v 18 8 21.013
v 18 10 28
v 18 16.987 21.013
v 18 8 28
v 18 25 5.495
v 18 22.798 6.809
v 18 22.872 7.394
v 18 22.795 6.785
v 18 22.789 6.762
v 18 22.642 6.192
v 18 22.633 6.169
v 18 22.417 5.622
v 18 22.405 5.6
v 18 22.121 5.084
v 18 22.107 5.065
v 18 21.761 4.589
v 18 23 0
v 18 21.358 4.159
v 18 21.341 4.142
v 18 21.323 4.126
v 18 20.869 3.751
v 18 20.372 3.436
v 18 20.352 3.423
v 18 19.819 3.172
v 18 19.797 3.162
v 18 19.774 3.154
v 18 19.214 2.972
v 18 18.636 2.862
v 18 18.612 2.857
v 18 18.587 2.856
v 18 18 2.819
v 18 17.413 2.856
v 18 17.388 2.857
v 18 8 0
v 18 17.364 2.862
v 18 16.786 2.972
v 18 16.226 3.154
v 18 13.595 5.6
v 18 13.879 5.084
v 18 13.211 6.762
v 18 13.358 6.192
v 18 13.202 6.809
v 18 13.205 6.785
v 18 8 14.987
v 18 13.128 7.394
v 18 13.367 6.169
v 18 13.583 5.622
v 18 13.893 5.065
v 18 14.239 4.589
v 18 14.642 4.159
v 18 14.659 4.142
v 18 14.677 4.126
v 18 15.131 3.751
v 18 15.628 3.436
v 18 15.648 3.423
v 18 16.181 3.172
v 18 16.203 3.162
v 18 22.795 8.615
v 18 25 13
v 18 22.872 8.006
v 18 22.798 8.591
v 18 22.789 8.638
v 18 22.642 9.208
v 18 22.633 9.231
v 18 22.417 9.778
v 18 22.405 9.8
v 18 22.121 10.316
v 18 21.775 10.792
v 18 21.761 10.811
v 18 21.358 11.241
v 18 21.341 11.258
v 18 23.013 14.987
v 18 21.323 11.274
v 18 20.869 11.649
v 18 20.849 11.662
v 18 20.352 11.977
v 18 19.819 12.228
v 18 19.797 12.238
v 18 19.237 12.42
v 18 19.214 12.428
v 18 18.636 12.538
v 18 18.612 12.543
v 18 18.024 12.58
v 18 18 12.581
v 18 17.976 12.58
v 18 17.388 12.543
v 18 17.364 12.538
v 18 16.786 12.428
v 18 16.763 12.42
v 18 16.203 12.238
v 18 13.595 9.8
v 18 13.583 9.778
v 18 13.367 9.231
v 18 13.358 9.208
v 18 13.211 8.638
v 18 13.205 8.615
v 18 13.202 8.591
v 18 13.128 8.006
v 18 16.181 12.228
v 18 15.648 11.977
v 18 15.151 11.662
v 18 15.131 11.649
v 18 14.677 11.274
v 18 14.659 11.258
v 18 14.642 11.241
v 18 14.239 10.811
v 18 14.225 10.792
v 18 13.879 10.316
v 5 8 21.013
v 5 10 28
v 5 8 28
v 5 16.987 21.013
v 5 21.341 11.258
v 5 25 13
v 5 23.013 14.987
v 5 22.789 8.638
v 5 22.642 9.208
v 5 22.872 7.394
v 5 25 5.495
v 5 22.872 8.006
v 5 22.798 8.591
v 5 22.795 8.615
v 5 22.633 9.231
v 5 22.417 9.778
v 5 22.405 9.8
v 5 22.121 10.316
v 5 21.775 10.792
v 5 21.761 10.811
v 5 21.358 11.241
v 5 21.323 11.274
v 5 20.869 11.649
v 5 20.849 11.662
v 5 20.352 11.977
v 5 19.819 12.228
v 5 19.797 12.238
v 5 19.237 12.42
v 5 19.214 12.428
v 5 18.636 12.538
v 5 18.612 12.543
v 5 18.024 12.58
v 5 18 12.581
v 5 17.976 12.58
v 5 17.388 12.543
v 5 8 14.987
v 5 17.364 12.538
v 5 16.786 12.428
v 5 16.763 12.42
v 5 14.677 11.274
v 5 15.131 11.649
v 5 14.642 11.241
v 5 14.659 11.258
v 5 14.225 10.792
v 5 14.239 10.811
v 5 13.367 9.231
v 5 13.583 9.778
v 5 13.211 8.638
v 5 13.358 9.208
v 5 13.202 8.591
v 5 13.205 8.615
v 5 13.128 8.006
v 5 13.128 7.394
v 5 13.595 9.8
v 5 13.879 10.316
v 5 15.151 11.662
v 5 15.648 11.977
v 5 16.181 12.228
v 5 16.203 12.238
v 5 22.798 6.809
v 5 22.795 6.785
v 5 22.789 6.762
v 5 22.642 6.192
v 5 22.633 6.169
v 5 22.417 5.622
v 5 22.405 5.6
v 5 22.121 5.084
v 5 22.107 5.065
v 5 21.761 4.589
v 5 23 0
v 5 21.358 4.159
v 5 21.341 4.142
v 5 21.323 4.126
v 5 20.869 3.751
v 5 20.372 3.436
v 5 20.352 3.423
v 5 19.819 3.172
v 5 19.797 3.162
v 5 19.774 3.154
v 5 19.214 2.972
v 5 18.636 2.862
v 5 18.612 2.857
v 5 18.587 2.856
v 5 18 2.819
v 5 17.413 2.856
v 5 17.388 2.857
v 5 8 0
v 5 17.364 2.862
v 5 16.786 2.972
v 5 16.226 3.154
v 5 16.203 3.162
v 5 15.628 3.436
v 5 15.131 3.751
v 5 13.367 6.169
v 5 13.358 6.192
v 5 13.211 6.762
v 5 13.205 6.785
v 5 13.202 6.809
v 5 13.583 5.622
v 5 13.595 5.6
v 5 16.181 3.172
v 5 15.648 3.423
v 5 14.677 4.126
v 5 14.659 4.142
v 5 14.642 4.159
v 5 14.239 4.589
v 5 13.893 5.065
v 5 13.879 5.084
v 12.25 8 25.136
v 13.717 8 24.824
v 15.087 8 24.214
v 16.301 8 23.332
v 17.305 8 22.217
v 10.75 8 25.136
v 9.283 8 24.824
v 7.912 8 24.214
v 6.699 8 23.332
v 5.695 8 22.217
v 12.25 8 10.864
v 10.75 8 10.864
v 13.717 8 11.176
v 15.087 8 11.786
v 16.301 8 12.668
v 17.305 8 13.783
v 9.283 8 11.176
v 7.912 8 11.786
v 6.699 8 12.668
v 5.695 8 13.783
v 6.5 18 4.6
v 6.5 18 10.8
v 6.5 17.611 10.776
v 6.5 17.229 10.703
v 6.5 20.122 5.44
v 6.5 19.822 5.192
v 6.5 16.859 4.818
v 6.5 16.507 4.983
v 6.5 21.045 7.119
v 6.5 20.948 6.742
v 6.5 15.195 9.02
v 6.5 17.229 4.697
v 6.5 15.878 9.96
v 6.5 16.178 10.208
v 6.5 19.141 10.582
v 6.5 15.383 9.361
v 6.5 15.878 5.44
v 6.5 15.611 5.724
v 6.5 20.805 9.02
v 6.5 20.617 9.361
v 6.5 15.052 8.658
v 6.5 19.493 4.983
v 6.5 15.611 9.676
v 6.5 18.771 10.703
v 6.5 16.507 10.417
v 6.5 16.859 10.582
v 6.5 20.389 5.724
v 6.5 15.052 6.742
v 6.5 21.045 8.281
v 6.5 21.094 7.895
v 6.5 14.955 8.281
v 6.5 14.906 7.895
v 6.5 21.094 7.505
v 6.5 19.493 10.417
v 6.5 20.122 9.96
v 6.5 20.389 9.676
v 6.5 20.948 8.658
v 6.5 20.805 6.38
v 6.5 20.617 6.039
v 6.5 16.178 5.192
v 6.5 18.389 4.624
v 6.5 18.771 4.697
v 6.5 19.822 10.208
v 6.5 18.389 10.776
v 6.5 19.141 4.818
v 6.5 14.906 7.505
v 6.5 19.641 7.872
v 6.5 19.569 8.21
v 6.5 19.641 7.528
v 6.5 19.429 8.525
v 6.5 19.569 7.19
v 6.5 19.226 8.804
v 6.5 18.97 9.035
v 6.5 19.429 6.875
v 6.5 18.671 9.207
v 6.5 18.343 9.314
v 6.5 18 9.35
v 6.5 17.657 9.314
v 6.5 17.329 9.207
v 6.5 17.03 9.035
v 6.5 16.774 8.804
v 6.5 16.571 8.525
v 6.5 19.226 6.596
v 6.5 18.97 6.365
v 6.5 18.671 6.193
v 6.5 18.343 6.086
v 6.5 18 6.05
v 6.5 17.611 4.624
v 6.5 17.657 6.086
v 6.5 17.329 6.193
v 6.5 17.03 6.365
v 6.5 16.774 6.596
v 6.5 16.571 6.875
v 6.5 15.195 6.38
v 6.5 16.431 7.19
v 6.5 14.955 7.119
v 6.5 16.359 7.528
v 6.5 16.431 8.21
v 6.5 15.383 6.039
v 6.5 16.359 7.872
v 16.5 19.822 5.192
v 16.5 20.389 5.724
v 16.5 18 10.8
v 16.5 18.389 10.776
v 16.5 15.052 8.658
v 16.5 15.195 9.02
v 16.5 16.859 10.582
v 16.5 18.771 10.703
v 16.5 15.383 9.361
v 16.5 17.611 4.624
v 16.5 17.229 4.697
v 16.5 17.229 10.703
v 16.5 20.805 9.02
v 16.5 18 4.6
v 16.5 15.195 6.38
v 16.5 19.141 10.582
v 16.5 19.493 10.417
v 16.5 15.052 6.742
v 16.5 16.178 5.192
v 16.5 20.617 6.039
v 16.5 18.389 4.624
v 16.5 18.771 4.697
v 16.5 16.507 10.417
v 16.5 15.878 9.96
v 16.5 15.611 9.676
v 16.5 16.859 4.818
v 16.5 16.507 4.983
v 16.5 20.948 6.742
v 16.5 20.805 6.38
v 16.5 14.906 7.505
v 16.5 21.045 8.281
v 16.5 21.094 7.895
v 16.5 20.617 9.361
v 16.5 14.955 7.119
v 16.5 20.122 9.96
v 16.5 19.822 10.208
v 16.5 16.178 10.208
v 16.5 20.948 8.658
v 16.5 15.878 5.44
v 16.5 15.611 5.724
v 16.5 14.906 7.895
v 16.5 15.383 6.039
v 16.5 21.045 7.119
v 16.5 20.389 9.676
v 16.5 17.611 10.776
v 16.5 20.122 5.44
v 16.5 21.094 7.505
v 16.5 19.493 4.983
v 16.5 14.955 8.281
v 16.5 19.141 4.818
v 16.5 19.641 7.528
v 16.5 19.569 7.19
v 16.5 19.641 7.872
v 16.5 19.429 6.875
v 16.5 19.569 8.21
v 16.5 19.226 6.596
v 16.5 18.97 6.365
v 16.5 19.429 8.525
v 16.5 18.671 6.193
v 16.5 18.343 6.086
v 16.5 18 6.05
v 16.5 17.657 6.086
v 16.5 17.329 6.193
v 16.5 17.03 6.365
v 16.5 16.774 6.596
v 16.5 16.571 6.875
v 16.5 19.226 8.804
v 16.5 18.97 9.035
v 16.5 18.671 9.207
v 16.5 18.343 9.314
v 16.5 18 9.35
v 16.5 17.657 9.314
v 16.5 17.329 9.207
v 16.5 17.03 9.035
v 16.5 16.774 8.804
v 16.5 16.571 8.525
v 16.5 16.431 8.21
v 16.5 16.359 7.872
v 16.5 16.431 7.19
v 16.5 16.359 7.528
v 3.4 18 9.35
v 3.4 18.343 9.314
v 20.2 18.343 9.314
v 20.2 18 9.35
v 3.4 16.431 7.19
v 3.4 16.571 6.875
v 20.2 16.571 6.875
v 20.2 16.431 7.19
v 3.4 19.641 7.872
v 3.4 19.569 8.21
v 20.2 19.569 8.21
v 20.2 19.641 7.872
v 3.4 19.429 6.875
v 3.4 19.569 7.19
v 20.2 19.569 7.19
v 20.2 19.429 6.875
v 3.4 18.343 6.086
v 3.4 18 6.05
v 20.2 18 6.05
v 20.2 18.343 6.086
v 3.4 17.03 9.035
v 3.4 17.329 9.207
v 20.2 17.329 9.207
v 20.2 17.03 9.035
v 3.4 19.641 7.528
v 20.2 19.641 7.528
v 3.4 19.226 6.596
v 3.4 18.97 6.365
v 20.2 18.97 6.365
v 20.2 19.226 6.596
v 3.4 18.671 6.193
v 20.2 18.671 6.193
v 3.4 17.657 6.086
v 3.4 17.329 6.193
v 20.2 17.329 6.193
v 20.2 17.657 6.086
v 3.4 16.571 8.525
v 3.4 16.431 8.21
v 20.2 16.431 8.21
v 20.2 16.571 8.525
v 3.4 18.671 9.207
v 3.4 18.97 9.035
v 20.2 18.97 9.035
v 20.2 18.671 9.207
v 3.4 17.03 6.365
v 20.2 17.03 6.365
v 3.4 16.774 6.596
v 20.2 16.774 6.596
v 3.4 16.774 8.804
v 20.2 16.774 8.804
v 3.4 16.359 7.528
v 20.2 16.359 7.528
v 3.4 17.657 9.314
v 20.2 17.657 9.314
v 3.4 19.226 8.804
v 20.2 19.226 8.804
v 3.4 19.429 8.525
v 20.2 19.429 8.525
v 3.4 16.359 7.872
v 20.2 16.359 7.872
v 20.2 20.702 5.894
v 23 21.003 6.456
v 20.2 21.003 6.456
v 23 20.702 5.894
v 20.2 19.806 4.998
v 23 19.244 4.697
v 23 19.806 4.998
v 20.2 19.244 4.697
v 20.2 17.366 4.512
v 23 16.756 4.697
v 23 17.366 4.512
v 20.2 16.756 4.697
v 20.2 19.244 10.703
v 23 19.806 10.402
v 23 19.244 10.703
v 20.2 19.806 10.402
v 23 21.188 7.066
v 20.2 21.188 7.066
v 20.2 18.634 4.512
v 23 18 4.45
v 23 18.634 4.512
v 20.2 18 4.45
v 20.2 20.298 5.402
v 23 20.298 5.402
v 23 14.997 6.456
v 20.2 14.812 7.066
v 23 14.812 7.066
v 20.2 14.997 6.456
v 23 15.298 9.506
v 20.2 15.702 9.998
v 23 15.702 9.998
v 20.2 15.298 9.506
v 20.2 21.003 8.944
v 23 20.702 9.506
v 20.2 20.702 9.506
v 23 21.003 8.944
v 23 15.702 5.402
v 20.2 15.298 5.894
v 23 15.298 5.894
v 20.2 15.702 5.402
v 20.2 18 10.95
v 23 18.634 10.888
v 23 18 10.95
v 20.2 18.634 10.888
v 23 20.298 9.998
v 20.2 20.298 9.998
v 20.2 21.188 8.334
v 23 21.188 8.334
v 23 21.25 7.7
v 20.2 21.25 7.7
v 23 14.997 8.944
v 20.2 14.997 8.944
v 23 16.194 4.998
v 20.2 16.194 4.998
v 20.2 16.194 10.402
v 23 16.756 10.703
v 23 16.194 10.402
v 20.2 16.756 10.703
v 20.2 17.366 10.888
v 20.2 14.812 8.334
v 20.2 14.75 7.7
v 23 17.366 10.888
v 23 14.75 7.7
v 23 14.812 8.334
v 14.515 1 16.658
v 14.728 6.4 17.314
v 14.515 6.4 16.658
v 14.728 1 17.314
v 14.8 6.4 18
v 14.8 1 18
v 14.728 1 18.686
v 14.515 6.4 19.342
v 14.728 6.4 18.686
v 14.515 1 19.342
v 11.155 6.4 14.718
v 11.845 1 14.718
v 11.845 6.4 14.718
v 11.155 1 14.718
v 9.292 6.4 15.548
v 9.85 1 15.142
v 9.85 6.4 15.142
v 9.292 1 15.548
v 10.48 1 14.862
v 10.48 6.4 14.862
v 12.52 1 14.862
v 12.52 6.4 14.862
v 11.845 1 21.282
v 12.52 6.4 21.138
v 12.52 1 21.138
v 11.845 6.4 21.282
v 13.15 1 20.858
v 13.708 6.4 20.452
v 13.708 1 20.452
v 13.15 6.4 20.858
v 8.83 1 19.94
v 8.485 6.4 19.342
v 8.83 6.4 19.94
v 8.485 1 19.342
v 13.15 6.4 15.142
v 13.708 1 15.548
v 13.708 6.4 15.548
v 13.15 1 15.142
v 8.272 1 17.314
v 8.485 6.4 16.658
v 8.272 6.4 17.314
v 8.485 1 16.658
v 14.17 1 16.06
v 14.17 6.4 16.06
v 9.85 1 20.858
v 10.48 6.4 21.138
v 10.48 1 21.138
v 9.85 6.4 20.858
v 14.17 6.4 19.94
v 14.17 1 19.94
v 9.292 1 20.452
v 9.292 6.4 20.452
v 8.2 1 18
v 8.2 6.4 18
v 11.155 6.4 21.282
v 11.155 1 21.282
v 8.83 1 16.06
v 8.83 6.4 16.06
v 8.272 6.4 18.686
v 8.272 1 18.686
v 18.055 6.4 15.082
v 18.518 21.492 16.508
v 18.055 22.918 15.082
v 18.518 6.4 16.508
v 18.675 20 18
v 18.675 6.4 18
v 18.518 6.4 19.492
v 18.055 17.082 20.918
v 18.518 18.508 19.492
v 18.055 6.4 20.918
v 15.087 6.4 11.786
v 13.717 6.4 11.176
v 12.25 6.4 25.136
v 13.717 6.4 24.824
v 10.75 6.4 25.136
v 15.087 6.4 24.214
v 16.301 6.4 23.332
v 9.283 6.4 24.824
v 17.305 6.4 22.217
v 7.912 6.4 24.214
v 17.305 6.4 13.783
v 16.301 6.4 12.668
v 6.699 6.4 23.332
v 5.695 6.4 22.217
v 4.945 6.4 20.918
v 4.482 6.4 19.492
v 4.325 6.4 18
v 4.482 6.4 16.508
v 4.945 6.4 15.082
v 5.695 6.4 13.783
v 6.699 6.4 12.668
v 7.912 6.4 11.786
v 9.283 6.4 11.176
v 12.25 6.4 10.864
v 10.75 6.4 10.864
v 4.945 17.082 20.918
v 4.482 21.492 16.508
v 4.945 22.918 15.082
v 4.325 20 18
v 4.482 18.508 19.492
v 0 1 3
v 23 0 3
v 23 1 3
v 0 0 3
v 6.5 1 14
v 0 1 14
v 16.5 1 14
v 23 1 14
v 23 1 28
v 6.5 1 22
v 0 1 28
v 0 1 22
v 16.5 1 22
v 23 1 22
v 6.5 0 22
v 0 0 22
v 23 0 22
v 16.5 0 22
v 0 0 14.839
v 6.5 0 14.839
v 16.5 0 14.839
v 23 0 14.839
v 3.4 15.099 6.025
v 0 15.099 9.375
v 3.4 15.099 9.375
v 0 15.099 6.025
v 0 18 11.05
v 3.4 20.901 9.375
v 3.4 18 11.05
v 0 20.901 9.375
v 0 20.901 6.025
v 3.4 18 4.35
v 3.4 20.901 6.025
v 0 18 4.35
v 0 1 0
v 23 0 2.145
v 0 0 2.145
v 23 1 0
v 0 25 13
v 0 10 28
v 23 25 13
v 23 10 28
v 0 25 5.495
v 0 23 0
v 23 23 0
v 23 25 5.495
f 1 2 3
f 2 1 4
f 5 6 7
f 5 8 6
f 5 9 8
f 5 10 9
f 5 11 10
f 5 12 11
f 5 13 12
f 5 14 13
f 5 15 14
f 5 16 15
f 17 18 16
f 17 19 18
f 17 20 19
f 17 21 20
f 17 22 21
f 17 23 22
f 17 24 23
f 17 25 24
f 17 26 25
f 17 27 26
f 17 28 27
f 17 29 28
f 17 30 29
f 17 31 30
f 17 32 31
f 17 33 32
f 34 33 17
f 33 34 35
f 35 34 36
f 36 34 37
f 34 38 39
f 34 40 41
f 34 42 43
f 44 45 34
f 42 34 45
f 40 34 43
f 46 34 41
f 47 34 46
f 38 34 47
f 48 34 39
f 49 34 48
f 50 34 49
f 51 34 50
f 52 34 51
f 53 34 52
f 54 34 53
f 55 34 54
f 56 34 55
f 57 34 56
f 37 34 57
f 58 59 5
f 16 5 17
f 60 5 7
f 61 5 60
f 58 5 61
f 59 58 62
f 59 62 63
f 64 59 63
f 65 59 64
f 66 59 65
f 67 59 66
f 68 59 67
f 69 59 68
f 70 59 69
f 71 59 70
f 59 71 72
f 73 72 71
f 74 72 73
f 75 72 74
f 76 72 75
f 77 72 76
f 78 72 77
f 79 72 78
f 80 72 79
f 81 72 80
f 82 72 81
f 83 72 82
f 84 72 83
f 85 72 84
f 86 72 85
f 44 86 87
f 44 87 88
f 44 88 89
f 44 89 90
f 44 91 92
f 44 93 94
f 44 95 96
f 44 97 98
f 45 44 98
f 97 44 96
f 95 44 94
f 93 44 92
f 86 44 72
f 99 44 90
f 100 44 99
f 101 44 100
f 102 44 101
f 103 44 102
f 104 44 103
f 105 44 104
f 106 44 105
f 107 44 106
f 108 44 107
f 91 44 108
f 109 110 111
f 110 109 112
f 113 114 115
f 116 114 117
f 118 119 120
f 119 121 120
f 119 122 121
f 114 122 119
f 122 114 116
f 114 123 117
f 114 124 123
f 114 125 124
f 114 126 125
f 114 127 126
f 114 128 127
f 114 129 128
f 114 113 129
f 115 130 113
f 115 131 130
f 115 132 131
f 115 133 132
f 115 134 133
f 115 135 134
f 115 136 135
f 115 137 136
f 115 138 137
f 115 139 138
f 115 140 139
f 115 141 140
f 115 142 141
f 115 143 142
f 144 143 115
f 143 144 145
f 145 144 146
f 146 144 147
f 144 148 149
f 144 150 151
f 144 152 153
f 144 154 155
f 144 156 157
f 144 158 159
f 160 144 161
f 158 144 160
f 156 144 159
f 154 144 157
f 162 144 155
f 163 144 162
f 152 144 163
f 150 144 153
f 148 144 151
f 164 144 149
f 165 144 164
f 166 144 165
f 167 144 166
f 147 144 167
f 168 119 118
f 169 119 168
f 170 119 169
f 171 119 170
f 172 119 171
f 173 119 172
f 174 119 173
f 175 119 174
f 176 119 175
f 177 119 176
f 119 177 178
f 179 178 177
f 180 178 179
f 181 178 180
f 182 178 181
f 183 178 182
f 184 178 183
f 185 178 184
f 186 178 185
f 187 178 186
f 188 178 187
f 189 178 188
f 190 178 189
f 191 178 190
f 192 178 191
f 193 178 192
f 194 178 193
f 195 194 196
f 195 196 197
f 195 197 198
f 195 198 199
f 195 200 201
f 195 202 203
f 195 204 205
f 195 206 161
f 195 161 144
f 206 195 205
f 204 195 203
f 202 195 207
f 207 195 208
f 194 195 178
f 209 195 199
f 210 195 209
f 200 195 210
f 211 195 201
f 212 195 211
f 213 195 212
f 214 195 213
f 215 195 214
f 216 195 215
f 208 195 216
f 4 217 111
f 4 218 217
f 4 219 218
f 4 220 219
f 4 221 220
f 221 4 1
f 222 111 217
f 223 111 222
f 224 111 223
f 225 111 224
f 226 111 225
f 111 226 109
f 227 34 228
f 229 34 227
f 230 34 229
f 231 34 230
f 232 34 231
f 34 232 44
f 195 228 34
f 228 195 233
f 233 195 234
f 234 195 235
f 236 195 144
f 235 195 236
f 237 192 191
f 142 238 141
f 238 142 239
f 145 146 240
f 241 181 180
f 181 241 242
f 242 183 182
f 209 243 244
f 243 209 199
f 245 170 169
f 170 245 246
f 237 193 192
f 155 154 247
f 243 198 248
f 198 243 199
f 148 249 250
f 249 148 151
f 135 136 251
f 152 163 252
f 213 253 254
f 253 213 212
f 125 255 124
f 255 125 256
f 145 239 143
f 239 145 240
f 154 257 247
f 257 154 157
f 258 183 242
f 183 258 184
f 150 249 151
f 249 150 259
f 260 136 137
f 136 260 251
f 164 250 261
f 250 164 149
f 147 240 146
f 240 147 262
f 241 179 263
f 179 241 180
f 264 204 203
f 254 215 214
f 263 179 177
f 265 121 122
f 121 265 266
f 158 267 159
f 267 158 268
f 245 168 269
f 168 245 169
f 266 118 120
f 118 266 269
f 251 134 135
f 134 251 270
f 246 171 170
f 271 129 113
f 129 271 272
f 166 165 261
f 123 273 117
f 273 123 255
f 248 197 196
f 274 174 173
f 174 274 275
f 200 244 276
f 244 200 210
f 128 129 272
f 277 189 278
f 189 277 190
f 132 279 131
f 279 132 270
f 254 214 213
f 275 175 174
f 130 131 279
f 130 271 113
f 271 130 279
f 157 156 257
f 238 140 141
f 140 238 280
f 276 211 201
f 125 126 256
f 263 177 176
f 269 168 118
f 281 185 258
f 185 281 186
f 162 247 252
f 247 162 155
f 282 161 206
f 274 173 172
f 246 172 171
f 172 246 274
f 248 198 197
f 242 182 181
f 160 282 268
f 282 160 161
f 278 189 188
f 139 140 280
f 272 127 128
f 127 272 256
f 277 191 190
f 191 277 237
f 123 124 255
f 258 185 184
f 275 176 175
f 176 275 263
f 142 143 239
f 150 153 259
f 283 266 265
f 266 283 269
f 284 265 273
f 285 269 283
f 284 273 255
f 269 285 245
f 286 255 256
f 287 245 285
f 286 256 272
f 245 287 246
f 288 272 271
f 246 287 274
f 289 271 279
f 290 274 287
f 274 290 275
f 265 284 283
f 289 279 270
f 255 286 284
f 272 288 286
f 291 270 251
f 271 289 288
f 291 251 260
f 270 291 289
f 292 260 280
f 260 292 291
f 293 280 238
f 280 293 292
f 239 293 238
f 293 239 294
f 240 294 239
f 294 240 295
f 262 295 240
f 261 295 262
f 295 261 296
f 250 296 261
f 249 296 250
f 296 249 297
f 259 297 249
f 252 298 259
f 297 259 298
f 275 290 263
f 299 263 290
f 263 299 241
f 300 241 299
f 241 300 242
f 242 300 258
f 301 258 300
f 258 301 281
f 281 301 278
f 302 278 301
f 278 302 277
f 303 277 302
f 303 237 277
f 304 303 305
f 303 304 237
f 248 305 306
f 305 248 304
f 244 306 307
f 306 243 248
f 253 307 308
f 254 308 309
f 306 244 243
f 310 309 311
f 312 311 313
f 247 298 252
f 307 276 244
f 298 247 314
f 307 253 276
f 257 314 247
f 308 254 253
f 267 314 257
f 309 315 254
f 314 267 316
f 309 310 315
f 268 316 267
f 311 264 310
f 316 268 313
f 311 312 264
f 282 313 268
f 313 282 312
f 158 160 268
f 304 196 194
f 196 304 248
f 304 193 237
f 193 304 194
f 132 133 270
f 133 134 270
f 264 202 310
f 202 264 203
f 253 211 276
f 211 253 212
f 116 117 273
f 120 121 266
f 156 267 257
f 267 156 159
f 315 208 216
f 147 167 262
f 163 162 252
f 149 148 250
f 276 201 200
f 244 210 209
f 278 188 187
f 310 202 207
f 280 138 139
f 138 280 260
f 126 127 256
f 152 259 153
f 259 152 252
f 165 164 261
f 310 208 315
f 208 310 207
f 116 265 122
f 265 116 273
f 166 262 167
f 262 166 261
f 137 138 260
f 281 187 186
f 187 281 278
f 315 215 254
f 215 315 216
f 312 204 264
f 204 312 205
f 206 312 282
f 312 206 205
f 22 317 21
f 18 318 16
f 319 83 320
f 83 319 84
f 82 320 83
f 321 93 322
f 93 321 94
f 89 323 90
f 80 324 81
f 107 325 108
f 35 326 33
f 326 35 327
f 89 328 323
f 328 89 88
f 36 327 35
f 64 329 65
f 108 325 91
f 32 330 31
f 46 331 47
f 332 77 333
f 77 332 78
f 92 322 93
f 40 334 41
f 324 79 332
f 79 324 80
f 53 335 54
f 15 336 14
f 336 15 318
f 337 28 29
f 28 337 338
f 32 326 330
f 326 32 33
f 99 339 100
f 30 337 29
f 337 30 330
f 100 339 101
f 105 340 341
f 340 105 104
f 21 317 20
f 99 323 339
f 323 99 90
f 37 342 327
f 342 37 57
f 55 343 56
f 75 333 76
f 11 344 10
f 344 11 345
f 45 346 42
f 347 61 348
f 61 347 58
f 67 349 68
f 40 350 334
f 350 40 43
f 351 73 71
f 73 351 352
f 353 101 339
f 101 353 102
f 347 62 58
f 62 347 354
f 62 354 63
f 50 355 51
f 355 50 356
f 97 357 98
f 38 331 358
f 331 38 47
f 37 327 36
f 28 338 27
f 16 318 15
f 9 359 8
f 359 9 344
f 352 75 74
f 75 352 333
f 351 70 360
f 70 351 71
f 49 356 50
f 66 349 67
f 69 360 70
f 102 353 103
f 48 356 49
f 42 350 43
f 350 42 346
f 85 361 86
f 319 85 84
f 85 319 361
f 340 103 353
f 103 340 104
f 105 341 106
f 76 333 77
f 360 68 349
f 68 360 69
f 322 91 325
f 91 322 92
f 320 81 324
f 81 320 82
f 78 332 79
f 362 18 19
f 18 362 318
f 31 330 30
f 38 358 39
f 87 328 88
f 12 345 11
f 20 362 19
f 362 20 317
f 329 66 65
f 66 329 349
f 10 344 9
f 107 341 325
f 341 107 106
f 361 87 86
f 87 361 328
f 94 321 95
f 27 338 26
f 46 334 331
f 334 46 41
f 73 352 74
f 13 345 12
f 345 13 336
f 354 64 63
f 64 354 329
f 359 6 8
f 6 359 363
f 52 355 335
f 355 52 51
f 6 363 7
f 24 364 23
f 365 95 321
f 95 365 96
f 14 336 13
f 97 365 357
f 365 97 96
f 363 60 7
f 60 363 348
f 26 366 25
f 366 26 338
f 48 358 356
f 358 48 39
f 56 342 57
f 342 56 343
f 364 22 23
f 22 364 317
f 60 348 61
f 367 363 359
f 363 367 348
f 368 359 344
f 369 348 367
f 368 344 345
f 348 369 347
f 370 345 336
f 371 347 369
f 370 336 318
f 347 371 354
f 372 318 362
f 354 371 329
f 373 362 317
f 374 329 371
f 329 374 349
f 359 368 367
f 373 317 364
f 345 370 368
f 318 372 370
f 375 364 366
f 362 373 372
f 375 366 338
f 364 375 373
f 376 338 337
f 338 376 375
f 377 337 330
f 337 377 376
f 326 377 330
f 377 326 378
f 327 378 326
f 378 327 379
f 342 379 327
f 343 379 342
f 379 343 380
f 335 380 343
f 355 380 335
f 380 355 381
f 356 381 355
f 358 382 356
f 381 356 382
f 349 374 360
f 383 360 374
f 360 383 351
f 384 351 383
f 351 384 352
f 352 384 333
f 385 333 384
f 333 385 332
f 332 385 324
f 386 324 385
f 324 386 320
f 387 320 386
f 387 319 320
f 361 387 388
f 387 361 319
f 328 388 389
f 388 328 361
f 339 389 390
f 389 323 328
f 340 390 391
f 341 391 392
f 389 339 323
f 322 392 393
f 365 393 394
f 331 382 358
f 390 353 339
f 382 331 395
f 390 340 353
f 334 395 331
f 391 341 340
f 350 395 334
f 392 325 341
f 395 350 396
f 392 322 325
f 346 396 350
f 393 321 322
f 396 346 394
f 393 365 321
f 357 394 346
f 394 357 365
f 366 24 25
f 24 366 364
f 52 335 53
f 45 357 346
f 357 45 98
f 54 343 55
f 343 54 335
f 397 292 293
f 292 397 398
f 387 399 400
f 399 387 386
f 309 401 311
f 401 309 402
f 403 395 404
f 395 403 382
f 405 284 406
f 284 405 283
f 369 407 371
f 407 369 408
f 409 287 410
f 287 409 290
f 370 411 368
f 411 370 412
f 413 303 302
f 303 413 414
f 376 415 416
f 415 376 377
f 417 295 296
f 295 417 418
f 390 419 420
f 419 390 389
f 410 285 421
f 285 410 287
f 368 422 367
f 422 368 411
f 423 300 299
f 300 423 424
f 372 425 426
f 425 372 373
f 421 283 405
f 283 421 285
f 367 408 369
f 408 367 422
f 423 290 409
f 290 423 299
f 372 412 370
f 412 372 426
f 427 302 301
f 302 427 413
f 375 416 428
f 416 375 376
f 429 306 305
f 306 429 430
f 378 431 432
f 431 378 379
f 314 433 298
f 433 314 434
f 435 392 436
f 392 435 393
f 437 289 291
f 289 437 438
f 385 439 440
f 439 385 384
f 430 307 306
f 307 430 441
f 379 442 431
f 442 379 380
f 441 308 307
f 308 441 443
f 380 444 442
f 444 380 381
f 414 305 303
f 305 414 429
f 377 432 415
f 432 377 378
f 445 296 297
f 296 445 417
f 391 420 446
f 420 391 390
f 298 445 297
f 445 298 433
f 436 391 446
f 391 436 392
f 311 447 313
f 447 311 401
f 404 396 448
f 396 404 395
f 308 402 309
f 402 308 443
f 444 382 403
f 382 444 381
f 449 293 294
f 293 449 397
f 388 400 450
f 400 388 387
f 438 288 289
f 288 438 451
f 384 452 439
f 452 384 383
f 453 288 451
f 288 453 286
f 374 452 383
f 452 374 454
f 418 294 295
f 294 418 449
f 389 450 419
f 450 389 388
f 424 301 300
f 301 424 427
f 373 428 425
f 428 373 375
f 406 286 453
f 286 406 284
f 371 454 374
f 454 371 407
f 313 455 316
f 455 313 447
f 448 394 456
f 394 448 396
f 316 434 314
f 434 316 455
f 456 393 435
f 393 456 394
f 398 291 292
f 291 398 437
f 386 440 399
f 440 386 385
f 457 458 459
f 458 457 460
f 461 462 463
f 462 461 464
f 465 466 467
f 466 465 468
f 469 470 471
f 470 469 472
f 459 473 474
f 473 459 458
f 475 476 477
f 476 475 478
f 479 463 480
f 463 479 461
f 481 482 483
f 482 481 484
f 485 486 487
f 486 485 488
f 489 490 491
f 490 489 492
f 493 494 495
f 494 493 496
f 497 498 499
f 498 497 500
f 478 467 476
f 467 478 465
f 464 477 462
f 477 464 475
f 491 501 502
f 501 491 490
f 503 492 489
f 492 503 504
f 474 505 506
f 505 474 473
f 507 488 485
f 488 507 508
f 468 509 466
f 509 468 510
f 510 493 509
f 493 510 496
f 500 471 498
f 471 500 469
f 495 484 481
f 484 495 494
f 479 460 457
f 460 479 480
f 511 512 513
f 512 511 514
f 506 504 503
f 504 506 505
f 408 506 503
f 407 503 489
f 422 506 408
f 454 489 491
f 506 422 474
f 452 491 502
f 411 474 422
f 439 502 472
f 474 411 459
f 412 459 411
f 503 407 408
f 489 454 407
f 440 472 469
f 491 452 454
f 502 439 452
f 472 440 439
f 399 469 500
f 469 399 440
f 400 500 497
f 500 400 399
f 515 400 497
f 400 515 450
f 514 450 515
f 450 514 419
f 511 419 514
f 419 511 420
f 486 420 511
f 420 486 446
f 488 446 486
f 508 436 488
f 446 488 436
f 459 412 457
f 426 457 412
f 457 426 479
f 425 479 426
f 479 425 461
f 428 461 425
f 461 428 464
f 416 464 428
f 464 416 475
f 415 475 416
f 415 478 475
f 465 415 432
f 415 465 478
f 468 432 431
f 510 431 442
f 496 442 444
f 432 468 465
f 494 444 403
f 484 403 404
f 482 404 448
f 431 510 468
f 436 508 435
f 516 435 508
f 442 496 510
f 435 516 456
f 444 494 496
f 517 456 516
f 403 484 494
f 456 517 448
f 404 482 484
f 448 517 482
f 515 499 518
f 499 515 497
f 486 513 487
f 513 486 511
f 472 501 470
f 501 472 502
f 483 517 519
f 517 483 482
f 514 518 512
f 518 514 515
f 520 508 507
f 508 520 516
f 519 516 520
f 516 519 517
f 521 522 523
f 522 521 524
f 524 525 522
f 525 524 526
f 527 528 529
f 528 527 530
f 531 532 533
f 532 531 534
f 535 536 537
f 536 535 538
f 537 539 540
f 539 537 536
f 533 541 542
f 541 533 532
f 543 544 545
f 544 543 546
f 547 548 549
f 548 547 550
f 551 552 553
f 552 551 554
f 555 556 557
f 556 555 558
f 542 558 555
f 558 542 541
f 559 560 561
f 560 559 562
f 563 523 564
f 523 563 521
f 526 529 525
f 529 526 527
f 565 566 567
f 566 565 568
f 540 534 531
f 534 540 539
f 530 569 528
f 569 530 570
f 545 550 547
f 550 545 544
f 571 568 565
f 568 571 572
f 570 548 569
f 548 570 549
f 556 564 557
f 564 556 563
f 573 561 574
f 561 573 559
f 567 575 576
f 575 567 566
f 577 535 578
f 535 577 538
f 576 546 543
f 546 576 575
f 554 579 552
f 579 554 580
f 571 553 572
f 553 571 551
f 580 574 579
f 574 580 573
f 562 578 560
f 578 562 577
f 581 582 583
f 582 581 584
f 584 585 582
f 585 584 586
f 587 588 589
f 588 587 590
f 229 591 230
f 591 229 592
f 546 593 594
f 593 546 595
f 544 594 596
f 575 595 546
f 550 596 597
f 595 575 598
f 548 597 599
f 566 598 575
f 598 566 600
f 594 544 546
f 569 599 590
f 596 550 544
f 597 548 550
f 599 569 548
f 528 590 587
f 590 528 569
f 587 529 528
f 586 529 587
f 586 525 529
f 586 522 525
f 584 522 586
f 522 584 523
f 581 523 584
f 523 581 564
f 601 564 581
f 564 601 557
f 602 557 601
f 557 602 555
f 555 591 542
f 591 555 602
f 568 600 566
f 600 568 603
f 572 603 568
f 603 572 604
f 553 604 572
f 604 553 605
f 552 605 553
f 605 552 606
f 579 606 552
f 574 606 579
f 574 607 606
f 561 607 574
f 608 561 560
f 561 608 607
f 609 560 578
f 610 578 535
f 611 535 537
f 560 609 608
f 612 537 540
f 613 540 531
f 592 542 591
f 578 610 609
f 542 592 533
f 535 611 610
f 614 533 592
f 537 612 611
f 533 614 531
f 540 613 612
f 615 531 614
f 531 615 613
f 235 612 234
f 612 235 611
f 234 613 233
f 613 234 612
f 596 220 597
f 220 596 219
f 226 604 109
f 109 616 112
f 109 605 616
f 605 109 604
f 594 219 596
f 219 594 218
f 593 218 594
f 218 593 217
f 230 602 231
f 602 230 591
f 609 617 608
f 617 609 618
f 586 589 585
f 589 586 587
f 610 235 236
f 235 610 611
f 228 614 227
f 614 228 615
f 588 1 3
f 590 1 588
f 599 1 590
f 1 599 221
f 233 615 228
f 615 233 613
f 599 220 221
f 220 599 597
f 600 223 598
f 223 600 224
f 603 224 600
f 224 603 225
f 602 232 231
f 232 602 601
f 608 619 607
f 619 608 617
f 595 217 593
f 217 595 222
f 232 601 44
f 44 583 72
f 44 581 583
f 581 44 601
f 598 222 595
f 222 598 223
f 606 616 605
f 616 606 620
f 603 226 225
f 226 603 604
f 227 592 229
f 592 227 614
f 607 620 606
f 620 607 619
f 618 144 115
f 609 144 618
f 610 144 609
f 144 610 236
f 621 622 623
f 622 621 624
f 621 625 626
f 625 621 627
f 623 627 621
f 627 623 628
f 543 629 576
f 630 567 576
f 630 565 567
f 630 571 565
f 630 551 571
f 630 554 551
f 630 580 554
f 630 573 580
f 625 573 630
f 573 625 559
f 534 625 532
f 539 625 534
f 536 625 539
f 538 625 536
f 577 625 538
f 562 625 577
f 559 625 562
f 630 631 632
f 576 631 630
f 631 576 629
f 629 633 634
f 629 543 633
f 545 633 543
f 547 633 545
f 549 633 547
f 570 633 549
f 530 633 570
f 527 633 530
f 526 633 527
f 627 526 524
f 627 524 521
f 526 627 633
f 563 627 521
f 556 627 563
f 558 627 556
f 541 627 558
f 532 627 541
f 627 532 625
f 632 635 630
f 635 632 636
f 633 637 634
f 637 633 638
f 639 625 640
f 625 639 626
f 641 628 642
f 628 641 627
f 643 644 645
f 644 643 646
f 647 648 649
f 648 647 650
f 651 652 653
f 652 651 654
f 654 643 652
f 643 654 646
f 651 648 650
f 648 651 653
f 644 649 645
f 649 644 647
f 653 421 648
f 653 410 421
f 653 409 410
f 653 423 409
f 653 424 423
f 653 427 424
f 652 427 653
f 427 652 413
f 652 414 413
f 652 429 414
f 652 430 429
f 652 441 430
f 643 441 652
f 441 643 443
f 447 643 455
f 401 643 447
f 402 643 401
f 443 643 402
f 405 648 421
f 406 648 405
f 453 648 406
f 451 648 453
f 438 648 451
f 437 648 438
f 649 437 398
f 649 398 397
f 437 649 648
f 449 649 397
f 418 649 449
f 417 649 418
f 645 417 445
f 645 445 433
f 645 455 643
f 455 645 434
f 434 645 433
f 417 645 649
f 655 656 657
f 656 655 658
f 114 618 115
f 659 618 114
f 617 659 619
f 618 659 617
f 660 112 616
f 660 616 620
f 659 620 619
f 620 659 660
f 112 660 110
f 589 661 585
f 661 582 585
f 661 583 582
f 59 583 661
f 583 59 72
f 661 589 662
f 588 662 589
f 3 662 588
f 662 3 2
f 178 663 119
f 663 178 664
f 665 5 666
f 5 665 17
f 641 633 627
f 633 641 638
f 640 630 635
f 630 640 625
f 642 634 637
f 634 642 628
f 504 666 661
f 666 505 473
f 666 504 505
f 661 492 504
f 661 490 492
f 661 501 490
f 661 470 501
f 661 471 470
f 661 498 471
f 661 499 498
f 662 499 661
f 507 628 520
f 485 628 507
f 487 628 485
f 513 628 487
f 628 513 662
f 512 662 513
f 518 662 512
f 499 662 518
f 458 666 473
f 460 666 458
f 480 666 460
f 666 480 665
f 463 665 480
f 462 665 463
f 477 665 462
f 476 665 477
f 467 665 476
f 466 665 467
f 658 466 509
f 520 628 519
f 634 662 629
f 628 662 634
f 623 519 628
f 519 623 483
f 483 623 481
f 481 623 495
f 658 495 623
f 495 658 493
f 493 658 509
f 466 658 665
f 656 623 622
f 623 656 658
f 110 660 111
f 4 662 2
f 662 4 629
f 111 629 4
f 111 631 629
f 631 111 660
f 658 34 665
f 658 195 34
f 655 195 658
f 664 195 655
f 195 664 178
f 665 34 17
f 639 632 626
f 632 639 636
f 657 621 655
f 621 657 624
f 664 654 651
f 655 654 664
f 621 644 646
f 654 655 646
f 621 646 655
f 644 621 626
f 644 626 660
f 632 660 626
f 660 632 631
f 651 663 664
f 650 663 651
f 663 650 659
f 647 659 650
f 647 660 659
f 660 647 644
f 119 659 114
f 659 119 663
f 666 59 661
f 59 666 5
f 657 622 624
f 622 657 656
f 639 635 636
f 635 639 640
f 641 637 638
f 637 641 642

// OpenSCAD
// file: ../configuration.scad
// Layer high for the printing [mm]
layer_height = 0.20; //Slic3r->Print Settings->Layers and perimeters->Layer height

// Spare for the screws heads [mm]
spare = 0.75;
// M6 screw diameter [mm]
M6_head_diameter = 13.6+spare;
//M6_head_diameter = 10.6+spare;
//M6_head_diameter = 12+spare;

// M6 head high (for hiding it) [mm]
//M6_head_height = 4;
M6_head_height = 3.6;
//M6_head_height = 4.5;

// Screws and rods diameters
M8_smooth_rod_diameter = 8.3;
M8_smooth_rod_diameter_catch = 8.4;
// Prumer 8mm tyce
rod_8mm_d = 8.2; //pro dil z-top
M6_diameter = 6.6;
M6_dia=M6_diameter; //pro dil z-top
M6_diamater_horizontal = 6.5;
M3_diameter = 3.7;
M3_diameter_horizontal = 3.5;

//matice trapézové tyče
TRAP_diameter_externa=22; //průmer vnější


// Nuts diameters
M3_nut_diameter = 7.0;
M3_nut_diameter_horizontal = 6.7;

// ALU profile parameters
ALU_cut_width = 7.9;
ALU_cut_width_horizontal = 7.7;

// Sirka matky do profilu (pokud neni pouzita, tak 0)
profile_nut_width = 10;
//profile_nut_width = 0; //pro z-top

// Motors length/depth (for axes Z and Y)
//SX17-1003LQFE (recommended for the Z axis)
motor_length = 29.5;
//SX17-1003 (recommended for the Z axis)
//motor_length = 34;
//SX17-1005
//motor_length = 40;
//SX17-0905 - this motor is too high - the Z end stop holder has to be adjusted
//motor_length = 48;

// Extrusion width [mm]
extrusion_width = 0.66; //Slic3r->Print Settings->Advanced->Default extrusion width

/// Belt type ******************************************************

// GT2
belt_tooth_distance = 2;
belt_tooth_ratio = 0.5;
belt_tooth_height = 1.4;
belt_thickness = 2.3;


// T2.5
//belt_tooth_distance = 2.5;
//belt_tooth_ratio = 0.68;

// Z screw......



// Tloustka rohovych spojek
// 5 mm => sroub M6x14 s podlozkou
// 3 mm => sroub M6x12 s podlozkou
coupler_thickness = 3;
// main file
// RebeliX
//
// y-idler
// GNU GPL v3
// Martin Neruda <neruda@reprap4u.cz>
// http://www.reprap4u.cz

include <../configuration.scad>
$fn = 50;
// Lozisko 624
bearing_width = 10;

wall = 5;
height = 28;
depth = 25;
width = bearing_width+2*wall+3;
base_thickness = 8;

module y_idler_base(){
	cube([width,depth,height]);
}

module y_idler_cuts(){
	difference(){
	  // Vyrez pro lozisko
	  translate([wall,base_thickness,-0.1]) cube([width-2*wall,depth,height+1]);
	  // Mezera pro loziska
	  translate([wall-0.1,depth-7,7.7]) rotate([0,90,0]) cylinder(r1=5,r2=3.1,h=1.6);
	  translate([width-wall+0.1,depth-7,7.7]) rotate([0,-90,0]) cylinder(r1=5,r2=3.1,h=1.6);
	}
	// Otvor pro sroub na lozisko
	translate([width/2,depth-7,7.7]) rotate([0,90,0]) cylinder(d = 3.3, h = width+1, $fn = 30,center=true);
	translate([width,depth-7,7.7]) rotate([0,90,0])cylinder(d=6.5,h=wall+0.6,$fn=32,center=true);
	
	// Otvor na prisroubovani do kombistojky
	translate([width/2,-0.1,3+15]) rotate([-90,0,0]) cylinder(r = M6_dia/2, h = depth, $fn = 30);
	// Otvor pro zahloubeni M6 sroubu
	translate([width/2,base_thickness-M6_head_height+2,3+15]) rotate([-90,0,0]) cylinder(r = M6_head_diameter/2, h = depth, $fn = 30);
	// Vyrez pro hlinikovy profil
	translate([-0.1,-0.1,3]) cube([width+1,1.1,15-4]);
	translate([-0.1,-0.1,3+15+4]) cube([width+1,1.1,15-4]);
	translate([-0.1,1,3+15-4]) rotate([180 - 40,0,0]) cube([30,3,8]); 
	// Otvor na matku
	translate([-0.1,depth-7,7.7]) rotate([0,90,0]) cylinder(h = 3.5, d=6.7, $fn=6);	
	// Setreni plastem
	translate([-0.1,1,0]) rotate([115,0,0]) cube([width+1,6,6]);
	translate([-0.1,depth,13]) rotate([45,0,0]) cube([width+1,depth+2,height]);
	translate([-0.1,depth-2,0]) rotate([-20,0,0]) cube([width+1,10,10]);
	
	// Vyrez pro profilovou matku 
    translate([width/2,-6/2 + 1,3+15]) cube([profile_nut_width,6,10],center=true);
	
	// Lozisko
	%translate([wall+1.5,depth-7,7.7]) rotate([0,90,0]) cylinder(r = 6.5, h = bearing_width, $fn = 30);
}

difference(){
	y_idler_base();
	y_idler_cuts();
}	
